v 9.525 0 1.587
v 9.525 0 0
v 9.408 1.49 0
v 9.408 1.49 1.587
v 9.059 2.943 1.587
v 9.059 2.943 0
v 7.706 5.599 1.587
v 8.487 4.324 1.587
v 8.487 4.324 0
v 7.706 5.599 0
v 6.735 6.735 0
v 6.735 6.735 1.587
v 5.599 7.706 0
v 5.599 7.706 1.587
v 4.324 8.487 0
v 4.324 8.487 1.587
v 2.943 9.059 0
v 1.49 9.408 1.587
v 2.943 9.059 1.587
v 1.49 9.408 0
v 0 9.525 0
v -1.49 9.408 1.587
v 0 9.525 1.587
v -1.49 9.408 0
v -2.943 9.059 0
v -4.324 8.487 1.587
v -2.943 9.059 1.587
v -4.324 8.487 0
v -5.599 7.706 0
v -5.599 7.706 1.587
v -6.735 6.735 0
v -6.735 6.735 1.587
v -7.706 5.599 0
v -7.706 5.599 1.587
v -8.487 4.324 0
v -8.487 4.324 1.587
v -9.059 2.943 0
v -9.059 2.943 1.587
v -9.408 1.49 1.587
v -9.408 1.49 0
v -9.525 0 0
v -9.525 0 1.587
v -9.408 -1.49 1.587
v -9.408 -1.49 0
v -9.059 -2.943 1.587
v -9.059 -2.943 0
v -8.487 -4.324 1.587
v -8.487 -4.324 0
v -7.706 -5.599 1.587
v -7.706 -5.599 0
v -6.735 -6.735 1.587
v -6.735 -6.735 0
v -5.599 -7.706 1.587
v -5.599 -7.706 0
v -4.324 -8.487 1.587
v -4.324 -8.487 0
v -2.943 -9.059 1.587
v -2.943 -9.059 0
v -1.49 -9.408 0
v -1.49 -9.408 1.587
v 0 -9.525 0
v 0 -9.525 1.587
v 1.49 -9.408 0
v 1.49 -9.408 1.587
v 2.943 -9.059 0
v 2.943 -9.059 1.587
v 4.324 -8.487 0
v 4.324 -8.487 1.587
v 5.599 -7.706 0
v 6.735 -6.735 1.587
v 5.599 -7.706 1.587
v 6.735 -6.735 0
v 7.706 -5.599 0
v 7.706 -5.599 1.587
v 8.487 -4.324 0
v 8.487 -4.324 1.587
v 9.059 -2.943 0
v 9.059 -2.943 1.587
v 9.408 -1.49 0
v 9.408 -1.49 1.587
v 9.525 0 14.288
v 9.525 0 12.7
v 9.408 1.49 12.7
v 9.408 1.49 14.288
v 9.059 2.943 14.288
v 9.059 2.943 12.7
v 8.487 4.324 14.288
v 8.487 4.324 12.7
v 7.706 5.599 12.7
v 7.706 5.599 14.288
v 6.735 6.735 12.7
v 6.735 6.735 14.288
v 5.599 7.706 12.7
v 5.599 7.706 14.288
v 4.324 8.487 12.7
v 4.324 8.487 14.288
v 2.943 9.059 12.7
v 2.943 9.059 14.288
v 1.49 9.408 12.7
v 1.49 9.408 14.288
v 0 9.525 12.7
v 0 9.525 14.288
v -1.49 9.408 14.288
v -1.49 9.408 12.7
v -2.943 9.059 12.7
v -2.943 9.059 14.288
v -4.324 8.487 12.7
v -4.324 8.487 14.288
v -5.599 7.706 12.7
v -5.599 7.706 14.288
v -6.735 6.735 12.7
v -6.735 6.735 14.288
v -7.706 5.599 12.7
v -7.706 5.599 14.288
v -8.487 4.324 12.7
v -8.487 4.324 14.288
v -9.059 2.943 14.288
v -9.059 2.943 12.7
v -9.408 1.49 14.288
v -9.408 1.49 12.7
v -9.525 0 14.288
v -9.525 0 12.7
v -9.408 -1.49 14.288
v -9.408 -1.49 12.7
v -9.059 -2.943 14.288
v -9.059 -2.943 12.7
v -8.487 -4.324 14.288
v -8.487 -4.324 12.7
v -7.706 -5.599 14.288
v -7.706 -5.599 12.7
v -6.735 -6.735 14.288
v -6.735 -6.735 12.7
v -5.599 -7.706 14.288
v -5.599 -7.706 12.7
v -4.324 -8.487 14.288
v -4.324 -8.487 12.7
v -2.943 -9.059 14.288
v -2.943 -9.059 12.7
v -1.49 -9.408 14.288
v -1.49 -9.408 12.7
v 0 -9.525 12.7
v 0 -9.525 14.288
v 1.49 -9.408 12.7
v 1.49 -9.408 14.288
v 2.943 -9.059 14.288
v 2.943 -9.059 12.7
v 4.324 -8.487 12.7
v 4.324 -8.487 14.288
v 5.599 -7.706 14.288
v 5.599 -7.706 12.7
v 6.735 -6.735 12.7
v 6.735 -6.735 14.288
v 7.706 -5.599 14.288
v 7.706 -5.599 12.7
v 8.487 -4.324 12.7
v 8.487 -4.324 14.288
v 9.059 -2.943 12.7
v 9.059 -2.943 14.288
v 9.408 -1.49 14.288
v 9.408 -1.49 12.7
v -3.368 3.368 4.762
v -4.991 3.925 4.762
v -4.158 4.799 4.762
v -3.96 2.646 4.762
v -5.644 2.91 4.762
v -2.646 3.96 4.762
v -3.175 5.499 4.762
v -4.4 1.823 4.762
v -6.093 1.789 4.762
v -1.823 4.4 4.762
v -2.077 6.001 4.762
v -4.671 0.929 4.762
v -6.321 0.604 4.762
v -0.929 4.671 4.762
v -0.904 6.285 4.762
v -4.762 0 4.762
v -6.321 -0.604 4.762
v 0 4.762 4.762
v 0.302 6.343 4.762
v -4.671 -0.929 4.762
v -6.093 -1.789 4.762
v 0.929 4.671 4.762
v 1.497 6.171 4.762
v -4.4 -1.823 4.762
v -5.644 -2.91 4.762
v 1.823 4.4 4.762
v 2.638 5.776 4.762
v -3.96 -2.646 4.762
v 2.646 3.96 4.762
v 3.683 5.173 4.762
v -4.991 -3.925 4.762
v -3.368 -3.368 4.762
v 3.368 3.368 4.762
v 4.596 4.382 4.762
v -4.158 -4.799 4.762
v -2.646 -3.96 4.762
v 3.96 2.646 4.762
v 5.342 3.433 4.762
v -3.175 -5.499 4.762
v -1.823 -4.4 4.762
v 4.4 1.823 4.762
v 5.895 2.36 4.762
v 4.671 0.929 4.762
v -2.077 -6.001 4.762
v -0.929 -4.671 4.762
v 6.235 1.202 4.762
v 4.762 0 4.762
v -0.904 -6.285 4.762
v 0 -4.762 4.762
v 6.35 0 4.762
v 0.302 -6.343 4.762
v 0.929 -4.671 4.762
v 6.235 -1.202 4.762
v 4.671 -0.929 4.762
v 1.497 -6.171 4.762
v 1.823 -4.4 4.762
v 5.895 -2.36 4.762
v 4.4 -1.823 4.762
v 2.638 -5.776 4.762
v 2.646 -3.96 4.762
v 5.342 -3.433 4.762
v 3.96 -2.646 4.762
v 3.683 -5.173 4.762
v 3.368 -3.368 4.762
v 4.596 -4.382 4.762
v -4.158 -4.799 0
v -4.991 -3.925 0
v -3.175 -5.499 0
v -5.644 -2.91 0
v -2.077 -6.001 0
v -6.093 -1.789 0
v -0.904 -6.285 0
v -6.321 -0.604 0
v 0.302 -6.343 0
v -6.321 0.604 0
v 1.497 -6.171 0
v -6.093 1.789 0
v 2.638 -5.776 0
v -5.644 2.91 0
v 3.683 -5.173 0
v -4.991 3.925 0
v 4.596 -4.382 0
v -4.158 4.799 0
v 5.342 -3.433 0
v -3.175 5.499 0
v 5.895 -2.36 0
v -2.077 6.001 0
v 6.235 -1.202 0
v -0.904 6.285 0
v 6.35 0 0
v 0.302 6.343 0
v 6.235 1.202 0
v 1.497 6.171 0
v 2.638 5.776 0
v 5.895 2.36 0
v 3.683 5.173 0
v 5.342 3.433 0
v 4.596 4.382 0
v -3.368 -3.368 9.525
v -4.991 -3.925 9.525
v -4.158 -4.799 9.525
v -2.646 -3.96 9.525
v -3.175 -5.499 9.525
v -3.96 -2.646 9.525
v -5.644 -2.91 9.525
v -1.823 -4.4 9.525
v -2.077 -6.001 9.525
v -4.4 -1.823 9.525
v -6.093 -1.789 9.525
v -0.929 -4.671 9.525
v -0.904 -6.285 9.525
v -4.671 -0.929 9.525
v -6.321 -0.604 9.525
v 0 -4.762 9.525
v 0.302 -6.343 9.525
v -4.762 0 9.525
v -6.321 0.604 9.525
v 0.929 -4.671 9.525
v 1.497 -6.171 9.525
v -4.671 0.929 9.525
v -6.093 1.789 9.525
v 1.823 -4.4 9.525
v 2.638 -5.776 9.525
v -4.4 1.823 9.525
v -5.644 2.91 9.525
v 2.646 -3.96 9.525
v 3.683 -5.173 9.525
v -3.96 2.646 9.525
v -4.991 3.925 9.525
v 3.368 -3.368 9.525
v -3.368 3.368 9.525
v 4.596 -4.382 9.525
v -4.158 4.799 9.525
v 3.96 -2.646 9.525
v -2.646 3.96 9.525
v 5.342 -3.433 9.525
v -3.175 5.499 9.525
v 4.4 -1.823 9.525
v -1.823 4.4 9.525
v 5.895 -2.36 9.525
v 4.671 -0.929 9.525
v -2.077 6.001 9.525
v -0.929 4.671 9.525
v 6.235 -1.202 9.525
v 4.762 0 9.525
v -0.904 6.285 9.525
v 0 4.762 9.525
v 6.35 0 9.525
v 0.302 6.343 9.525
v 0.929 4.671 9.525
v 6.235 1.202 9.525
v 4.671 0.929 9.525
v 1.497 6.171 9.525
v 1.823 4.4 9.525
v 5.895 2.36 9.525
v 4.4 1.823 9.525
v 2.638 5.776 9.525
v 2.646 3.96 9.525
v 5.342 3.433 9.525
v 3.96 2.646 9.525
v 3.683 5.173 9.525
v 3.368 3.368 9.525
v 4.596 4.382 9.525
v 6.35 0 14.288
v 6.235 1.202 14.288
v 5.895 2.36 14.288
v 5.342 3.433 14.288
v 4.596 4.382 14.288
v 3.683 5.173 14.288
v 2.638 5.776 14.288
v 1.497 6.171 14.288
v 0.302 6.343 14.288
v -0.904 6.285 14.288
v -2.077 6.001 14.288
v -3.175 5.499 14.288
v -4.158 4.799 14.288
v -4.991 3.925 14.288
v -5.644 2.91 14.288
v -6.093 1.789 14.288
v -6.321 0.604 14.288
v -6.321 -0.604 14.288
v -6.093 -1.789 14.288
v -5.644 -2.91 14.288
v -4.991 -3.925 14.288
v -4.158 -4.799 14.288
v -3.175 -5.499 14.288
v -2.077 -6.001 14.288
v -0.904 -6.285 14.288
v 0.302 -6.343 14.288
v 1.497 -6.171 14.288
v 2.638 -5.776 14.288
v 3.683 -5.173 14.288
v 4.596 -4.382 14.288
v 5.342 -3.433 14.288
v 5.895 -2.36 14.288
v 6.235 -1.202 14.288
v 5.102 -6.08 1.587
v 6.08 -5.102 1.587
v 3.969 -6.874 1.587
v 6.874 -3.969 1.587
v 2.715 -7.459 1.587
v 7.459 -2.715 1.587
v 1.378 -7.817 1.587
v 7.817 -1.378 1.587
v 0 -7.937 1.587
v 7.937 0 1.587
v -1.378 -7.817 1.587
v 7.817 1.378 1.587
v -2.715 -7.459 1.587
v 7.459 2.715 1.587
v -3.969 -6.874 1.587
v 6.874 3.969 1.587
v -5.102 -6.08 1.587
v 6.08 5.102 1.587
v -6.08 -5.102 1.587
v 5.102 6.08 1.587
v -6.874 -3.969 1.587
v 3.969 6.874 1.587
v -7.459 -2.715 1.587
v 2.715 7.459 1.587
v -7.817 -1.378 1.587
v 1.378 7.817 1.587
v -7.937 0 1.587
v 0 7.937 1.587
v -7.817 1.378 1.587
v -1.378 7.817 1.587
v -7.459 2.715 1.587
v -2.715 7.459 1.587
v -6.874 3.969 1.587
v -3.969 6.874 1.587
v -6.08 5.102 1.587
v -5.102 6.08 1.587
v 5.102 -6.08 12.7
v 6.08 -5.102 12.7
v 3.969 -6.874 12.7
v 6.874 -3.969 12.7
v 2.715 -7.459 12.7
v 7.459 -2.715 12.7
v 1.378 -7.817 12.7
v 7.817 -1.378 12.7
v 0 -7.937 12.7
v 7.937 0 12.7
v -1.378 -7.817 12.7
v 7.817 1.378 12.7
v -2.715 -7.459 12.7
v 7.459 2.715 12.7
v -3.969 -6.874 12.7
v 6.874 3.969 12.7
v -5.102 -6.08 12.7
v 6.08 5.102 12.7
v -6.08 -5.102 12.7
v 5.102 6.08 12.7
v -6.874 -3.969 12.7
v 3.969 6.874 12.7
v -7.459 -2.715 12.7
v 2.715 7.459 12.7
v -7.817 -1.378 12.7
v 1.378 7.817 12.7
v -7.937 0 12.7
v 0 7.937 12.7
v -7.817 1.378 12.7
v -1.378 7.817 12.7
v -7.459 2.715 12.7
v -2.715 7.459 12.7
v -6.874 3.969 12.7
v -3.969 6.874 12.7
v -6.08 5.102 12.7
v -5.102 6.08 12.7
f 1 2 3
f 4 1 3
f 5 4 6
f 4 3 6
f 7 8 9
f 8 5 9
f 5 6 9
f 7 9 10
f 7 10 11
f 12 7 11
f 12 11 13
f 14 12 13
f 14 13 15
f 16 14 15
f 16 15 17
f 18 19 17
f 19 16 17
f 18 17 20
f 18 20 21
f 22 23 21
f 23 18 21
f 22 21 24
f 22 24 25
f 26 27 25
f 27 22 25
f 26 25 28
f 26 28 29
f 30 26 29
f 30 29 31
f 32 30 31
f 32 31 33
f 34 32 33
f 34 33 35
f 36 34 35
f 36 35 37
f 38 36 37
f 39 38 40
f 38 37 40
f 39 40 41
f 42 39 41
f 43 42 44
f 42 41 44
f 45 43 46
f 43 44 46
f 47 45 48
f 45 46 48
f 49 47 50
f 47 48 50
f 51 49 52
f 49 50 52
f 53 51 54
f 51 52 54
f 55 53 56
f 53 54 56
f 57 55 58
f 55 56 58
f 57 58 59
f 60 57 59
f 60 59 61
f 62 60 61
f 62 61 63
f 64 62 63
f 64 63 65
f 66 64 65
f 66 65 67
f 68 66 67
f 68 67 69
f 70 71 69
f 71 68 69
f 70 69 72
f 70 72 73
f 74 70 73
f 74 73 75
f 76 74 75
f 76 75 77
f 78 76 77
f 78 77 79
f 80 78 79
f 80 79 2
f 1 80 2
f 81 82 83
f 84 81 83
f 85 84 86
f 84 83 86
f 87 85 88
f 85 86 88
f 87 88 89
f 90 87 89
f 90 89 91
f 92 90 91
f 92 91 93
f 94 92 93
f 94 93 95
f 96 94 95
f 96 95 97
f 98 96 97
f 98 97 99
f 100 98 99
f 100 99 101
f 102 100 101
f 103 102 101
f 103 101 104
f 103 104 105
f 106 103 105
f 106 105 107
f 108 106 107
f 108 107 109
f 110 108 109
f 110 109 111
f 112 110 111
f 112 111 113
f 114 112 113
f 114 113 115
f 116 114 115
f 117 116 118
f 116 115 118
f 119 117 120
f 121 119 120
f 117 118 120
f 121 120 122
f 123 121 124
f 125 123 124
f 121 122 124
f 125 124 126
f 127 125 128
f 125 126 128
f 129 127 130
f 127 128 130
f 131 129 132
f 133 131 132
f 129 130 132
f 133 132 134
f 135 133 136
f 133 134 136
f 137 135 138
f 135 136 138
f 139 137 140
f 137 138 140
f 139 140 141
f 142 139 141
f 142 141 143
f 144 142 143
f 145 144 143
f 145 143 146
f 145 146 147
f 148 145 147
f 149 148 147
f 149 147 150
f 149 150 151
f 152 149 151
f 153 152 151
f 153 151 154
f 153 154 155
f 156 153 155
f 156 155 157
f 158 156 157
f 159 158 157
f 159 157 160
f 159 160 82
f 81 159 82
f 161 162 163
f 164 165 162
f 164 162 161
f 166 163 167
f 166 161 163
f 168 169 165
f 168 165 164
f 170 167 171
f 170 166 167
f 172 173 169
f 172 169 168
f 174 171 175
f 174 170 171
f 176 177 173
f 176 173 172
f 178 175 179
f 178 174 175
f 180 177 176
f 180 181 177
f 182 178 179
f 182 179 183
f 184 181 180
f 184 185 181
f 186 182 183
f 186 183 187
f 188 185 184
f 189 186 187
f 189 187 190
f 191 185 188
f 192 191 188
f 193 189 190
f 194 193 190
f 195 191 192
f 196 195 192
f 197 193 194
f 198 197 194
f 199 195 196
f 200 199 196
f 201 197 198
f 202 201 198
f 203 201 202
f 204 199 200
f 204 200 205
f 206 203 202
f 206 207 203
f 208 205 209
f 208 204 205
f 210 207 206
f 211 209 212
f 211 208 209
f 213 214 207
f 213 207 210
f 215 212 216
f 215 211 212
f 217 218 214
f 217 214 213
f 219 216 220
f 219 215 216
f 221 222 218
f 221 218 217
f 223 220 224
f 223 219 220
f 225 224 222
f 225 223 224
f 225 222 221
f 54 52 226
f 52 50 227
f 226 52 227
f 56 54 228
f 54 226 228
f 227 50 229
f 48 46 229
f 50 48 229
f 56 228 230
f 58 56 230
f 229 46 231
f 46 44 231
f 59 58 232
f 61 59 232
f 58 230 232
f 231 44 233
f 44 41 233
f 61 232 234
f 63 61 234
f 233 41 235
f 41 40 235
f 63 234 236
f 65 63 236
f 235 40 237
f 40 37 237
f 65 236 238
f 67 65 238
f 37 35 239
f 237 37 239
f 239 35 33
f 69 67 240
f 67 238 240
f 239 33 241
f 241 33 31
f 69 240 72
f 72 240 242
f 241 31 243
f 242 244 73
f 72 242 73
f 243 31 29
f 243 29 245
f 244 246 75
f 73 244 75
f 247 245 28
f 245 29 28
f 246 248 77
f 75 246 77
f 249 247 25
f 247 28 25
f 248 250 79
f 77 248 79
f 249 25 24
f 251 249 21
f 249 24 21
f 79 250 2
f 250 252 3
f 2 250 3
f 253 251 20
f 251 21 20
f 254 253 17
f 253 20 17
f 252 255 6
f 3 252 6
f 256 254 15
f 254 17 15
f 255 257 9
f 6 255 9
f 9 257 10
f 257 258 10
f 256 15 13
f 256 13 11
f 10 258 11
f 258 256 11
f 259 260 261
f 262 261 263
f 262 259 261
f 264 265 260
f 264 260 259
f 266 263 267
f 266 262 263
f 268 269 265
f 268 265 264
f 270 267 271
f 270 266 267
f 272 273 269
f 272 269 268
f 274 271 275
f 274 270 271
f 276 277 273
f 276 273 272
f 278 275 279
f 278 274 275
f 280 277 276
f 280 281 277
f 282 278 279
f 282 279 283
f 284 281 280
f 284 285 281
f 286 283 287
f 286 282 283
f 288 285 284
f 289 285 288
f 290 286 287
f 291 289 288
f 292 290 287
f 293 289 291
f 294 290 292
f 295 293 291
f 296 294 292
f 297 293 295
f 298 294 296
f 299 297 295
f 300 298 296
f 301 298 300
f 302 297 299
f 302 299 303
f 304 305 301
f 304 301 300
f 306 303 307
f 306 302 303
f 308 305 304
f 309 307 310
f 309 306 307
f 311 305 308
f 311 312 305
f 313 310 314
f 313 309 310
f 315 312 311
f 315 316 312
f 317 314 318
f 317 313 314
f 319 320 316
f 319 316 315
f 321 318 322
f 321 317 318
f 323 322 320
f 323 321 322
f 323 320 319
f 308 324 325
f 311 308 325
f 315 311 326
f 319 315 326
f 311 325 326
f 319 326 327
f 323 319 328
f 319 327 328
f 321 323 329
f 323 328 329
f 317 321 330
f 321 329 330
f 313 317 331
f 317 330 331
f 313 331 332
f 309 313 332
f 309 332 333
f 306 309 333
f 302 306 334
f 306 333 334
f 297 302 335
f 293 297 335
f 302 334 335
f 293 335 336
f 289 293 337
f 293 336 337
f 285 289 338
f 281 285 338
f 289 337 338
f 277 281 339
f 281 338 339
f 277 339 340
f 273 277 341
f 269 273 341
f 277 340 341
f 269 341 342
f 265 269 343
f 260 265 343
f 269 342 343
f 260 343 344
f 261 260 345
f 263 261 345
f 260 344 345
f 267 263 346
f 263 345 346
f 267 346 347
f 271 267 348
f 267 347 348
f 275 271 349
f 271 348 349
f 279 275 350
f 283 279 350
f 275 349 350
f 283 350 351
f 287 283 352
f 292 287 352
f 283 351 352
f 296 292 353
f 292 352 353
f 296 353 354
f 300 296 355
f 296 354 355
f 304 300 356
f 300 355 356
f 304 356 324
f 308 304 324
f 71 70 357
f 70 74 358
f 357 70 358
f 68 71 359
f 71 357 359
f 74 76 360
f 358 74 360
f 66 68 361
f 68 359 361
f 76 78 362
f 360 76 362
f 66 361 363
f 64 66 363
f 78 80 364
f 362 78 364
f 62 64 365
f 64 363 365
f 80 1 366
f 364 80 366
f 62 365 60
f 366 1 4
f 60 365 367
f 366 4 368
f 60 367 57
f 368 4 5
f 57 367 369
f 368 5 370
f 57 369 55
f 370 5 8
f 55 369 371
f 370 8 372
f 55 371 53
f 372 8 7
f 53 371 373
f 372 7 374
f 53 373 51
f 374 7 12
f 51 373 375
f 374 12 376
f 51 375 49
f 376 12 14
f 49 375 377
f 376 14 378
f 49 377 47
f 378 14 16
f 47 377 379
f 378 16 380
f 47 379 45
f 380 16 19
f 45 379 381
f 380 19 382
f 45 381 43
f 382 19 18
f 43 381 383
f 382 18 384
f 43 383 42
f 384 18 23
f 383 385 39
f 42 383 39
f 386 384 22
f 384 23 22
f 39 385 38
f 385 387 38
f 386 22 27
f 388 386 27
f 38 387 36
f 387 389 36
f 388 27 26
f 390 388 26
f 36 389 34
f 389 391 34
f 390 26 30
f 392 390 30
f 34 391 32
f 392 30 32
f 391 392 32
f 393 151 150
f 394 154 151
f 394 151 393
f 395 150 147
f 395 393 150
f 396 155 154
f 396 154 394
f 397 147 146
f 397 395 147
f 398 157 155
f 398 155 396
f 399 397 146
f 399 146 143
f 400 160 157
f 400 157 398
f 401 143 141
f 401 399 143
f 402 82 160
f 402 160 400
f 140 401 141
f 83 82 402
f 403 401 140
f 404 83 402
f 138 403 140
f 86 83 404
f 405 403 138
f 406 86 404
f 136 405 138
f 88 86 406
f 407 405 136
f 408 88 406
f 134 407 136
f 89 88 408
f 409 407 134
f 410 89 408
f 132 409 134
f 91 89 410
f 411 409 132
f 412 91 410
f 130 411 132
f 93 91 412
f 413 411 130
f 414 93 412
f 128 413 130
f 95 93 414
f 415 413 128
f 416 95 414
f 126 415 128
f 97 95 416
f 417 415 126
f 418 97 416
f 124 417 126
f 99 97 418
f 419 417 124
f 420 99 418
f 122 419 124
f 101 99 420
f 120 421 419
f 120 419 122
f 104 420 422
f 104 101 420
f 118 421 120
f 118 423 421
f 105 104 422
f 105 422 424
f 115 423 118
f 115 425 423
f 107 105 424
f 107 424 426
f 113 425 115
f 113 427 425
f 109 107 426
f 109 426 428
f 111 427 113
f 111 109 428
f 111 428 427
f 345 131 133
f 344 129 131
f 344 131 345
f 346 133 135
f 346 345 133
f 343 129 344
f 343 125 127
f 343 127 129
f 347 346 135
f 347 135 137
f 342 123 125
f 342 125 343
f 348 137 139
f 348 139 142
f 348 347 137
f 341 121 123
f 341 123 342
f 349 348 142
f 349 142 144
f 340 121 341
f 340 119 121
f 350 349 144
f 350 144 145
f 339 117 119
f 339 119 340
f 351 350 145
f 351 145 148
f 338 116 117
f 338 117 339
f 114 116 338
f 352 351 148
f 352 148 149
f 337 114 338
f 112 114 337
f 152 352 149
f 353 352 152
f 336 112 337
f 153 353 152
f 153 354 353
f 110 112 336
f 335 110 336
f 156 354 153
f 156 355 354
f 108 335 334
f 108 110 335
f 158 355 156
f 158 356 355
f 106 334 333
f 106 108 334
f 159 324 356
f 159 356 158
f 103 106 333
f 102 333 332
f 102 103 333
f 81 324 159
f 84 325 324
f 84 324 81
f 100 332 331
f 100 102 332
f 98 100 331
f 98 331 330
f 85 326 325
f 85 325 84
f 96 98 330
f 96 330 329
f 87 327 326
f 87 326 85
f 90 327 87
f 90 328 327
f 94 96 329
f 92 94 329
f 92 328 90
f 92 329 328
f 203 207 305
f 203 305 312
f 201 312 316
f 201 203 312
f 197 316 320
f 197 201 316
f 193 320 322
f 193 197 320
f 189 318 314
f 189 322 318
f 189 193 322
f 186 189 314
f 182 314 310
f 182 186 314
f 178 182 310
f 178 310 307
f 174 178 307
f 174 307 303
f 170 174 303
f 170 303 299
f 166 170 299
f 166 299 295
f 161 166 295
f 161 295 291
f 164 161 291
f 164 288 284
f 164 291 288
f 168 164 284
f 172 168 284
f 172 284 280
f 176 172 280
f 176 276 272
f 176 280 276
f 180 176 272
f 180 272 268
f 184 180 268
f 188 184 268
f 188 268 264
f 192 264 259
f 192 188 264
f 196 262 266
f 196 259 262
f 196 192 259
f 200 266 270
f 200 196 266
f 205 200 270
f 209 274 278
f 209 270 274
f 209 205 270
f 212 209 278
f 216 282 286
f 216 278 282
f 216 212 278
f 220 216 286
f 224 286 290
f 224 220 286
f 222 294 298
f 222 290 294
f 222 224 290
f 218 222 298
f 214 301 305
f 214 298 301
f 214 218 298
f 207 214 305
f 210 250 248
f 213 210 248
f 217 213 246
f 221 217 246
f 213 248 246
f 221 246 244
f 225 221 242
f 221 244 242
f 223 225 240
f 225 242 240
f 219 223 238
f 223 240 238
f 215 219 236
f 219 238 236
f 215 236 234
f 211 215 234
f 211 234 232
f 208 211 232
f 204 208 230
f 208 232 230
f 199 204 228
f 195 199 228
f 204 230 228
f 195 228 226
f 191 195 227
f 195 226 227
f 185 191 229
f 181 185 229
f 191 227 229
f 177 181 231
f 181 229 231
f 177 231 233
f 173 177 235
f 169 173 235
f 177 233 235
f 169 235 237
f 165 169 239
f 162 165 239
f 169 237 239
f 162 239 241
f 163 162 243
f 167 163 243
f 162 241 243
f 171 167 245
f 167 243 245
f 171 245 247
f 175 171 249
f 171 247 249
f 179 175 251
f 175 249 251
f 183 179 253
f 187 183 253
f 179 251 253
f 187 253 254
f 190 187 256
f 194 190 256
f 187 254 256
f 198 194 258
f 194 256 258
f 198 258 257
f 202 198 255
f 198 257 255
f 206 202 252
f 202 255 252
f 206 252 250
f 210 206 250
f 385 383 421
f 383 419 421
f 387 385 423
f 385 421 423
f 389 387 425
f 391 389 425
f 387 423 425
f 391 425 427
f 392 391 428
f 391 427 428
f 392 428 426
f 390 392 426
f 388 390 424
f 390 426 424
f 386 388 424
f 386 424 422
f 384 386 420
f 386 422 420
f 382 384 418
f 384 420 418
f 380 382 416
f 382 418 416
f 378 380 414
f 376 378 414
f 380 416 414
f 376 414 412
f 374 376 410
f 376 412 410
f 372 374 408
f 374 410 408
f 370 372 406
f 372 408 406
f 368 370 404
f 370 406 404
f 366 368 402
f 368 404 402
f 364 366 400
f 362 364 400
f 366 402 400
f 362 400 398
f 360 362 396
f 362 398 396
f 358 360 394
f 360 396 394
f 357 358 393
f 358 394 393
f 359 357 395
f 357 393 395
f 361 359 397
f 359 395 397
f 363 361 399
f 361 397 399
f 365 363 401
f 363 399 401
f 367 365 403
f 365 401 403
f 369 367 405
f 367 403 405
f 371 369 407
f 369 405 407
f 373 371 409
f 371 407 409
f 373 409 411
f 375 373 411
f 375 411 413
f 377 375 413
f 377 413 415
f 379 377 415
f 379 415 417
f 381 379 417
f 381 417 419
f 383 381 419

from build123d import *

# Parameters (mm, degrees)
F0_R     = 9.525
F0_R_2   = 4.7625
F1_DEPTH = 14.2875
F2_W     = 1.5875
F2_H     = 11.1125
F4_R     = 6.35
F5_DEPTH = 4.7625
F6_R     = 6.35
F7_DEPTH = 4.7625


with BuildPart() as f1:
    # F0 (on Top) → F1 (new body)
    with BuildSketch(Plane.XY):
        Circle(F0_R)
        Circle(F0_R_2, mode=Mode.SUBTRACT)
    extrude(amount=F1_DEPTH)

    # F2 (on Front) → F3 (revolve, cut)
    with BuildSketch(Plane.XZ):
        with Locations((-8.73125, 7.14375)):
            Rectangle(F2_W, F2_H)
    revolve(axis=Axis((0, 0, 0), (0, 0, -1)), mode=Mode.SUBTRACT)

    # F4 (on face) → F5 (cut)
    with BuildSketch(Plane.XY.offset(14.2875)):
        Circle(F4_R)
    extrude(amount=-F5_DEPTH, mode=Mode.SUBTRACT)

    # F6 (on face) → F7 (cut)
    with BuildSketch(Plane(origin=(0, 0, 0), x_dir=(1, 0, 0), z_dir=(0, 0, -1))):
        Circle(F6_R)
    extrude(amount=-F7_DEPTH, mode=Mode.SUBTRACT)


solid = f1.part
